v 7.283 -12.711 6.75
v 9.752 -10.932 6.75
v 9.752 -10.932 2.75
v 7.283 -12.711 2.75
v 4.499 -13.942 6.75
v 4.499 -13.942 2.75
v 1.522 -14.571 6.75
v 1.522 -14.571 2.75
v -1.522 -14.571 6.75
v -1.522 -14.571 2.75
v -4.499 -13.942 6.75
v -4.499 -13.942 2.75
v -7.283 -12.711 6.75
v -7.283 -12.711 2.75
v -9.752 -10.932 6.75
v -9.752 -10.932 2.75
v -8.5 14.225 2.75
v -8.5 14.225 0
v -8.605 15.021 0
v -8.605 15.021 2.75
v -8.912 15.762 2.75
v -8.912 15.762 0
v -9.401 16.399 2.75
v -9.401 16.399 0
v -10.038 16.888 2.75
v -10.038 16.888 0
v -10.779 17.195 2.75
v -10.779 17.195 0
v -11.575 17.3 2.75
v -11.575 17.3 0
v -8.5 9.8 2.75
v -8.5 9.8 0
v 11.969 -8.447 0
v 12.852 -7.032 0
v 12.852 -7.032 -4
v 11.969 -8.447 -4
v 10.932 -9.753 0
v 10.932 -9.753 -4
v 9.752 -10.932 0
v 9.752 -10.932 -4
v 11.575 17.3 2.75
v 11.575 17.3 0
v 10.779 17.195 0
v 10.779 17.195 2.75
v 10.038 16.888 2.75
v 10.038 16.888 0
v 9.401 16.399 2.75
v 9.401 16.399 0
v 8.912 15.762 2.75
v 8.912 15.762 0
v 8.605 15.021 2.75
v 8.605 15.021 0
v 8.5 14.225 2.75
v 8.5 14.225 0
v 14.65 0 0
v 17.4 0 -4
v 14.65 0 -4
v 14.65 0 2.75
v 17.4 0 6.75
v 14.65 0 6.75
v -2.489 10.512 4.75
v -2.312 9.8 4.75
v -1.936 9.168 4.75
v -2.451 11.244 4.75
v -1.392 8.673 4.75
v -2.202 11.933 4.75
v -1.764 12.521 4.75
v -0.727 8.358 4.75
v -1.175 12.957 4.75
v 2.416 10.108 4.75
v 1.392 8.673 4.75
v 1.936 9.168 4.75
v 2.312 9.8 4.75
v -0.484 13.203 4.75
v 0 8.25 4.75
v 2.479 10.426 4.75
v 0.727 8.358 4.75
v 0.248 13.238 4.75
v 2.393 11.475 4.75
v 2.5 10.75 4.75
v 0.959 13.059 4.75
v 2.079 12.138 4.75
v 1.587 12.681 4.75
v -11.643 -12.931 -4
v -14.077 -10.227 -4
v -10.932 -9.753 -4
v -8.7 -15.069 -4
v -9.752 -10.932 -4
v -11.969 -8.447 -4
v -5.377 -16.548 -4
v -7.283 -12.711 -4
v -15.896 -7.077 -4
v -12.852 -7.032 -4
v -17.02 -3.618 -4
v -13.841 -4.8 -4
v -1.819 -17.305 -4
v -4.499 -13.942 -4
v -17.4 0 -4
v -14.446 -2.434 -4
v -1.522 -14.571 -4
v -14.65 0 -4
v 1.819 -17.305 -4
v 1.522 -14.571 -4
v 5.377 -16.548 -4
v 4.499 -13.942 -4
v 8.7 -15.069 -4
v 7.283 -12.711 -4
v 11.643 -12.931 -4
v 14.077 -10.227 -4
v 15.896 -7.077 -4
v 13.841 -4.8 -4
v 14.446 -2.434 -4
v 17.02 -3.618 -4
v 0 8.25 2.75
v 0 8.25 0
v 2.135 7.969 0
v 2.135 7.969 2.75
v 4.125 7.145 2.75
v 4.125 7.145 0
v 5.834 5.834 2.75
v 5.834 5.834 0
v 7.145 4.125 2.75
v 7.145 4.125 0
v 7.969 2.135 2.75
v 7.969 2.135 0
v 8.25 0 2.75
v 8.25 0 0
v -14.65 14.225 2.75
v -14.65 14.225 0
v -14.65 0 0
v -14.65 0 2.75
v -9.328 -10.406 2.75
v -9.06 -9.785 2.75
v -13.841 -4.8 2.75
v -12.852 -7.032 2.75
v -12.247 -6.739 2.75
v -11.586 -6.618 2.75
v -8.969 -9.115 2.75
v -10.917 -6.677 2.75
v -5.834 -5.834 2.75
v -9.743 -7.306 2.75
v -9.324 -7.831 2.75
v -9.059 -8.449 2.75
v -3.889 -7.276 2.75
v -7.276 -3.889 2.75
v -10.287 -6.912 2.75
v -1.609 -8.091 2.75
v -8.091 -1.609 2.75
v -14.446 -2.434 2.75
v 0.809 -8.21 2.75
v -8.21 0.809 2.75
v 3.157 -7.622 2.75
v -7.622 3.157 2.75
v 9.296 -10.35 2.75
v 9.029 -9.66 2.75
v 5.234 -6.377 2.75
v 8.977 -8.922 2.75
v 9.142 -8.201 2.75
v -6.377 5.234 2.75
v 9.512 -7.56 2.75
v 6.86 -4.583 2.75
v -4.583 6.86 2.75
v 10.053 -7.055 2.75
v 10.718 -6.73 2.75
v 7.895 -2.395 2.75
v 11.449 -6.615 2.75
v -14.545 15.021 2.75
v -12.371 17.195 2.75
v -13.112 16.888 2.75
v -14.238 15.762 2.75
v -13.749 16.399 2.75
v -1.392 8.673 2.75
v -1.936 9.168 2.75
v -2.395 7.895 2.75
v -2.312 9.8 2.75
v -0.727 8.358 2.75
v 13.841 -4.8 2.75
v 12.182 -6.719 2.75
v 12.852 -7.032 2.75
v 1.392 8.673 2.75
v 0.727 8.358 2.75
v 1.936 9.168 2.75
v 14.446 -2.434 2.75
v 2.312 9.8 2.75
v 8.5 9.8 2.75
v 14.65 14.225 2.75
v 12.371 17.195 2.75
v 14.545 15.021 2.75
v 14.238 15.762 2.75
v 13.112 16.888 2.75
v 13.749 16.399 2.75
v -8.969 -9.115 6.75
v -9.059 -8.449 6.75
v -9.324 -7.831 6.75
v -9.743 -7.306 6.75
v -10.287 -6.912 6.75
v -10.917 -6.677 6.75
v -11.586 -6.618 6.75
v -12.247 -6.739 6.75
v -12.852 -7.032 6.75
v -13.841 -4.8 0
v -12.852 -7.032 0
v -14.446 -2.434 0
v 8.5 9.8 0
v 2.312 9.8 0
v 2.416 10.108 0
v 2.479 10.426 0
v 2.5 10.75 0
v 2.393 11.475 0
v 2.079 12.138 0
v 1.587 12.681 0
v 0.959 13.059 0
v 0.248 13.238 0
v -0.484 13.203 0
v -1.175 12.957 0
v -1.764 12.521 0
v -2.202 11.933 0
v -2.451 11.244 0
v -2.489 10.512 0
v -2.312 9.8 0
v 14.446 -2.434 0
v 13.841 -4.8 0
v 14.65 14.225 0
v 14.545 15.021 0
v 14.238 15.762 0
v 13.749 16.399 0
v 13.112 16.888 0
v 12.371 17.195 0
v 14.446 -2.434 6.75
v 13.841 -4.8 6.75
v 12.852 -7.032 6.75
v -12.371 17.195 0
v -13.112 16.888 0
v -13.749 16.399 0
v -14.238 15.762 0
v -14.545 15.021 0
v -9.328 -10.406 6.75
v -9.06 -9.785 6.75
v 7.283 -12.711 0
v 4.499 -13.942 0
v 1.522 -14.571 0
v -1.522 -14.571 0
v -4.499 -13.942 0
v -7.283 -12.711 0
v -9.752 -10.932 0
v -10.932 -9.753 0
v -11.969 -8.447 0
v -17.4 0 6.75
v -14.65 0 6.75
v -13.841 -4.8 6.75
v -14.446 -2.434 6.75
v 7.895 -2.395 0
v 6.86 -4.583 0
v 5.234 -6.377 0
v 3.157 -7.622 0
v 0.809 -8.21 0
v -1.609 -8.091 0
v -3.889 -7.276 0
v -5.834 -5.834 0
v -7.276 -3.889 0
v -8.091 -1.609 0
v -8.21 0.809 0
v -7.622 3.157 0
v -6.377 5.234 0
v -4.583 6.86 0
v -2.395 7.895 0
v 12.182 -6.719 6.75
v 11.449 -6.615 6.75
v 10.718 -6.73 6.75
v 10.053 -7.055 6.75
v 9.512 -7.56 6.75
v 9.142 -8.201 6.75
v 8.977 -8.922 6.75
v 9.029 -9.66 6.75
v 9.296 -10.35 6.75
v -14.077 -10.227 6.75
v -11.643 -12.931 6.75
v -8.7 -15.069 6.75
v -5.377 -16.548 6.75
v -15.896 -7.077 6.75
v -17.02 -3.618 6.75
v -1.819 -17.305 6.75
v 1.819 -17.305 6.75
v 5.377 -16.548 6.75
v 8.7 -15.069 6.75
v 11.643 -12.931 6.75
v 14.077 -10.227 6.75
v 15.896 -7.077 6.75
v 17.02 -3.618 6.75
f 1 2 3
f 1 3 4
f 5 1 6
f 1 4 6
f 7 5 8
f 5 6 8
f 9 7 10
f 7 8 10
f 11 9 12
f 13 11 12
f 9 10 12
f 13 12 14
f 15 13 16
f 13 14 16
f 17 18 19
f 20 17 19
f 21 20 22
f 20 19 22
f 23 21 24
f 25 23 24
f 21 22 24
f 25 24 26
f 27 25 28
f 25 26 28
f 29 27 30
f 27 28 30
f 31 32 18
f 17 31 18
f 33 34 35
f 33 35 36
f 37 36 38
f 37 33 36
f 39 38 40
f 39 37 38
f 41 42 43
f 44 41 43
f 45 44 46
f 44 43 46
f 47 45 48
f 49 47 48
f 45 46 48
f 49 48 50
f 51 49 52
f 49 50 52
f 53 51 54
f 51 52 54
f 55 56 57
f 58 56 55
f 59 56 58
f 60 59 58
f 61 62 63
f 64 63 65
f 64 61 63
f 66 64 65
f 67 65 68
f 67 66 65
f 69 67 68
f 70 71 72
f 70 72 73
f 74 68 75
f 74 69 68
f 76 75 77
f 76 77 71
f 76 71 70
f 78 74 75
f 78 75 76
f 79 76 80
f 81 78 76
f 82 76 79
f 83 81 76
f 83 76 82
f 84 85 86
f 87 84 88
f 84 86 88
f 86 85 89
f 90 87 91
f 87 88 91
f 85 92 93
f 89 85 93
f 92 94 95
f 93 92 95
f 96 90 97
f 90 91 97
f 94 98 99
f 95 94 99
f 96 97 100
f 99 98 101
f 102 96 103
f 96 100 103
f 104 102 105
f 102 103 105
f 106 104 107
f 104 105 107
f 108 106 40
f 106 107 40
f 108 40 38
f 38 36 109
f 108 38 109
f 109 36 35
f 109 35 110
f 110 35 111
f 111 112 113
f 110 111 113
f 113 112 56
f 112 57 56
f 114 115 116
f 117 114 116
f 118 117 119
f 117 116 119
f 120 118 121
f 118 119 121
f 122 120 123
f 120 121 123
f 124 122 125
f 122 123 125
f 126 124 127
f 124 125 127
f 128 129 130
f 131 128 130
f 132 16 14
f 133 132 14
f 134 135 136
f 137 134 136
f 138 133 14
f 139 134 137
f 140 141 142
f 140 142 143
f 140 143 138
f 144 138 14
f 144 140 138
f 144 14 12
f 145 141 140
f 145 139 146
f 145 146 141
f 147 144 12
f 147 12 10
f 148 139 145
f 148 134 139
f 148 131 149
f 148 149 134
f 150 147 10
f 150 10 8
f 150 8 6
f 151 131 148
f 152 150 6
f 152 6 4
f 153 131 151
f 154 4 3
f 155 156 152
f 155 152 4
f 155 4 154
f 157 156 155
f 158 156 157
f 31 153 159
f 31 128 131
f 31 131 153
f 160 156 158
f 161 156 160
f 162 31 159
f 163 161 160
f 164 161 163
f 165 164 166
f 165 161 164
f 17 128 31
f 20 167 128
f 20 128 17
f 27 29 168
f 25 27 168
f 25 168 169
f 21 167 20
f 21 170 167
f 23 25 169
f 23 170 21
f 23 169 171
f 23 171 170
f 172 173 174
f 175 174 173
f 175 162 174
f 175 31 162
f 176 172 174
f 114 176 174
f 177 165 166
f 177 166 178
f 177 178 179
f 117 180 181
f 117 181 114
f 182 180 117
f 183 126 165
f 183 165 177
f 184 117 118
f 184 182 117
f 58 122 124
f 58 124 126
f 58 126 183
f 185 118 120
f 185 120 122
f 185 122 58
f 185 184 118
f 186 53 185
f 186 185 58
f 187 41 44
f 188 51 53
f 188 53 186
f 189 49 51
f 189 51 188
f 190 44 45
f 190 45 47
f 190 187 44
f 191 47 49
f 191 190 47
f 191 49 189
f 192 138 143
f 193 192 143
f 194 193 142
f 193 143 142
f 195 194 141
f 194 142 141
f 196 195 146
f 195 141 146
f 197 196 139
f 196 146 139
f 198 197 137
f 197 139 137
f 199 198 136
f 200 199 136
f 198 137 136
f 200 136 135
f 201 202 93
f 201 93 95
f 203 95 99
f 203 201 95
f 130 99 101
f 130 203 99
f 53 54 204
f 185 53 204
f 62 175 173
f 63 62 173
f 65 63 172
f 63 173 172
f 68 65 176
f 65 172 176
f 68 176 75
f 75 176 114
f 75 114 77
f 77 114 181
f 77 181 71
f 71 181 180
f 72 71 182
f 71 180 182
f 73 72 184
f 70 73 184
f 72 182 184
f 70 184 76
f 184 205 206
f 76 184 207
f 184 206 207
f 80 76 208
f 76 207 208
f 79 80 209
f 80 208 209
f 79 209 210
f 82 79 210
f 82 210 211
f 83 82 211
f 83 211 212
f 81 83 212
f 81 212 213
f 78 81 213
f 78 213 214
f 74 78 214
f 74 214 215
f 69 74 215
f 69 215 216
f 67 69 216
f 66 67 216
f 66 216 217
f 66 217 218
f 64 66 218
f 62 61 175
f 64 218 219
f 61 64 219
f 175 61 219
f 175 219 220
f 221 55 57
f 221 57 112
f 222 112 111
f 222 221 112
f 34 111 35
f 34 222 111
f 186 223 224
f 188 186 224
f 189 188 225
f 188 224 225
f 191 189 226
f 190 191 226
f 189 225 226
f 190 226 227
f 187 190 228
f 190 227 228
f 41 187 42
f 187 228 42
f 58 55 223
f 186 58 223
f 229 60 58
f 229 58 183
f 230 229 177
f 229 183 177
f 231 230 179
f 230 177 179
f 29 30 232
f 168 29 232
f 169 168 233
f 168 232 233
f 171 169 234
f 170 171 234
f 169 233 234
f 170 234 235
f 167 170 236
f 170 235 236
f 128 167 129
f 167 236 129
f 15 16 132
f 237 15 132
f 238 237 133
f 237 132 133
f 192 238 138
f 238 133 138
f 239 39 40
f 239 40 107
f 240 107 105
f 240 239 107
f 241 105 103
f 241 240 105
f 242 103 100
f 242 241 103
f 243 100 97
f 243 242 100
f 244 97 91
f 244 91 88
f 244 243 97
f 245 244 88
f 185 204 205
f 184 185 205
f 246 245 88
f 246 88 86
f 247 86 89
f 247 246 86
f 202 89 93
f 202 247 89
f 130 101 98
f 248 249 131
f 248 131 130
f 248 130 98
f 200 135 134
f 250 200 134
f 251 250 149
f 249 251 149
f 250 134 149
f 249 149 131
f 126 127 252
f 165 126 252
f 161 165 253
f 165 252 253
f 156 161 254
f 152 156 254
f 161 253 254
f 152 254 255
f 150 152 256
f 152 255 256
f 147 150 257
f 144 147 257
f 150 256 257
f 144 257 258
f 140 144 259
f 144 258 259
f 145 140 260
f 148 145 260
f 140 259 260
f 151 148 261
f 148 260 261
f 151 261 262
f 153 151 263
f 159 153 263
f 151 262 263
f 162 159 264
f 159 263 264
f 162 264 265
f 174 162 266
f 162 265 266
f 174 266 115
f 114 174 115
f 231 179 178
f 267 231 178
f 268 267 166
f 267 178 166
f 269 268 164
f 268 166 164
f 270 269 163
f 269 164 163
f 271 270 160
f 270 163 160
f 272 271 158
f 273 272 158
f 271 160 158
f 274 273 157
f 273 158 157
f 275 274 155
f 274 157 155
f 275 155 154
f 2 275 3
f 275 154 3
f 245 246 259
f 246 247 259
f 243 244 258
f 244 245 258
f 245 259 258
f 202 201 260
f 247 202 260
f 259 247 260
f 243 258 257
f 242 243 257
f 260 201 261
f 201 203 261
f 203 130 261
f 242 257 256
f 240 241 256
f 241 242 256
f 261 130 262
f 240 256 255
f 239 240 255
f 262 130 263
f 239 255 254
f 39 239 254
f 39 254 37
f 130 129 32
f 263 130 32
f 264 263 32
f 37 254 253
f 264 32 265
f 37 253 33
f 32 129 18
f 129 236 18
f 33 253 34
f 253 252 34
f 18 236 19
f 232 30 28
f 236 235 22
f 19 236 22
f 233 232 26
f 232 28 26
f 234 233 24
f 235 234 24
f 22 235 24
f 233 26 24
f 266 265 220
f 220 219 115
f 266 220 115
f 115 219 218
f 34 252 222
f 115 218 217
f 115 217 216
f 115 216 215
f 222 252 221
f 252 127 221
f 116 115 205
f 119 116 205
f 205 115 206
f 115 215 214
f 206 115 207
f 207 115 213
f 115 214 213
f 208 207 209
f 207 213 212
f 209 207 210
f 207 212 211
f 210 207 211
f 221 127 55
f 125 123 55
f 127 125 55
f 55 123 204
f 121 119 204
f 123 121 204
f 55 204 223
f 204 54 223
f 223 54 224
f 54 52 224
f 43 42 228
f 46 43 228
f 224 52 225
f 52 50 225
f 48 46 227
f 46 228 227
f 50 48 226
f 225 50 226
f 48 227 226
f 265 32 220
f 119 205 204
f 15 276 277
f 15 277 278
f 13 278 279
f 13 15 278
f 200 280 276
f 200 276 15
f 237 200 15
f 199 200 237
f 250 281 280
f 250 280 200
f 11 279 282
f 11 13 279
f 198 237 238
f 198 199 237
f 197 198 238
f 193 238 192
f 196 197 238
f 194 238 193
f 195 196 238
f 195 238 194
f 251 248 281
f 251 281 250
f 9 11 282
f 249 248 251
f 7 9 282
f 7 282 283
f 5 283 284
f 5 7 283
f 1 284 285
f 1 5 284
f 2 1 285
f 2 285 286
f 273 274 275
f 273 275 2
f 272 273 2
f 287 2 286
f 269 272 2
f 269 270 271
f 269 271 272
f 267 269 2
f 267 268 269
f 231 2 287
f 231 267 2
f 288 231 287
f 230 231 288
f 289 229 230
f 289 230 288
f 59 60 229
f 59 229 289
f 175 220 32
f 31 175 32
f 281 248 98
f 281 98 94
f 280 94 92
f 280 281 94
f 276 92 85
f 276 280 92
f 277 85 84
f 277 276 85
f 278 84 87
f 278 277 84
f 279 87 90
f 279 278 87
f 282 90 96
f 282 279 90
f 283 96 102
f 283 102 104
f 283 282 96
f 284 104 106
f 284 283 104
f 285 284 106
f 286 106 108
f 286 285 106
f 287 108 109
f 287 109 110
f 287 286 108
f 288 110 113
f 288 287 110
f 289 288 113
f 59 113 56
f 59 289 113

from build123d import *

# Parameters (mm, degrees)
F1_DEPTH      = 2.75
F2_DEPTH      = 6.75
F2_DEPTH_BACK = 4
F3_DEPTH      = 6.75
F4_DEPTH      = 4.75


with BuildPart() as f1:
    # F0 (on Top) → F1 (new body)
    with BuildSketch(Plane.XY):
        with BuildLine():
            ThreePointArc((2.312466216, 9.8), (1.3919410963, 8.673344038), (1.34e-08, 8.25))
            ThreePointArc((1.34e-08, 8.25), (-1.3919410851, 8.6733440305), (-2.312466216, 9.8))
            Line((-2.312466216, 9.8), (-8.5, 9.8))
            Line((-8.5, 9.8), (-8.5, 11.9319948039))
            ThreePointArc((-8.5, 11.9319948039), (-13.02204861, 6.7118365594), (-14.65, 0))
            ThreePointArc((-14.65, 0), (-14.1933462479, -3.6292454155), (-12.8518536129, -7.0322371059))
            ThreePointArc((-12.8518536129, -7.0322371059), (-10.2873209178, -6.9119317152), (-8.9690606516, -9.1149957636))
            ThreePointArc((-8.9690606516, -9.1149957636), (-9.1731996175, -10.104451226), (-9.7522783412, -10.9323175565))
            ThreePointArc((-9.7522783412, -10.9323175565), (0, -14.65), (9.7522783412, -10.9323175565))
            ThreePointArc((9.7522783412, -10.9323175565), (9.511883066, -7.5595357357), (12.8518536129, -7.0322371059))
            ThreePointArc((12.8518536129, -7.0322371059), (14.1933462479, -3.6292454155), (14.65, 0))
            ThreePointArc((14.65, 0), (13.02204861, 6.7118365594), (8.5, 11.9319948039))
            Line((8.5, 11.9319948039), (8.5, 9.8))
            Line((8.5, 9.8), (2.312466216, 9.8))
        make_face()
        with BuildLine():
            ThreePointArc((1.34e-08, 8.25), (5.8336309495, 5.8336309401), (8.25, 0))
            ThreePointArc((8.25, 0), (-5.8336309495, -5.8336309401), (1.34e-08, 8.25))
        make_face(mode=Mode.SUBTRACT)
        with BuildLine():
            ThreePointArc((9.7522783412, -10.9323175565), (11.4690606516, -9.1149957636), (12.8518536129, -7.0322371059))
            ThreePointArc((12.8518536129, -7.0322371059), (9.511883066, -7.5595357357), (9.7522783412, -10.9323175565))
        make_face()
        with BuildLine():
            ThreePointArc((-8.9690606516, -9.1149957636), (-10.2873209178, -6.9119317152), (-12.8518536129, -7.0322371059))
            ThreePointArc((-12.8518536129, -7.0322371059), (-11.4690606516, -9.1149957636), (-9.7522783412, -10.9323175565))
            ThreePointArc((-9.7522783412, -10.9323175565), (-9.1731996175, -10.104451226), (-8.9690606516, -9.1149957636))
        make_face()
        with BuildLine():
            Line((8.5, 14.225), (8.5, 11.9319948039))
            ThreePointArc((8.5, 11.9319948039), (13.02204861, 6.7118365594), (14.65, 0))
            Line((14.65, 0), (14.65, 9.8))
            Line((14.65, 9.8), (14.65, 14.225))
            ThreePointArc((14.65, 14.225), (13.7493533521, 16.3993533521), (11.575, 17.3))
            ThreePointArc((11.575, 17.3), (9.4006466479, 16.3993533521), (8.5, 14.225))
        make_face()
        with BuildLine():
            ThreePointArc((-14.65, 0), (-13.02204861, 6.7118365594), (-8.5, 11.9319948039))
            Line((-8.5, 11.9319948039), (-8.5, 14.225))
            ThreePointArc((-8.5, 14.225), (-9.4006466479, 16.3993533521), (-11.575, 17.3))
            ThreePointArc((-11.575, 17.3), (-13.7493533521, 16.3993533521), (-14.65, 14.225))
            Line((-14.65, 14.225), (-14.65, 9.8))
            Line((-14.65, 9.8), (-14.65, 0))
        make_face()
        with BuildLine():
            ThreePointArc((-2.312466216, 9.8), (-1.3919410851, 8.6733440305), (1.34e-08, 8.25))
            ThreePointArc((1.34e-08, 8.25), (1.3919410963, 8.673344038), (2.312466216, 9.8))
            Line((2.312466216, 9.8), (0, 9.8))
            Line((0, 9.8), (-2.312466216, 9.8))
        make_face()
        with BuildLine():
            ThreePointArc((2.5, 10.75), (-0.4841665313, 13.2026684998), (-2.312466216, 9.8))
            Line((-2.312466216, 9.8), (0, 9.8))
            Line((0, 9.8), (2.312466216, 9.8))
            ThreePointArc((2.312466216, 9.8), (2.4526684998, 10.2658334687), (2.5, 10.75))
        make_face()
    extrude(amount=F1_DEPTH)

    # F0 (on Top) → F2 (join, two sides)
    with BuildSketch(Plane.XY) as f2_sk:
        with BuildLine():
            ThreePointArc((-12.8518536129, -7.0322371059), (-14.1933462479, -3.6292454155), (-14.65, 0))
            Line((-14.65, 0), (-17.4, 0))
            ThreePointArc((-17.4, 0), (0, -17.4), (17.4, 0))
            Line((17.4, 0), (14.65, 0))
            ThreePointArc((14.65, 0), (14.1933462479, -3.6292454155), (12.8518536129, -7.0322371059))
            ThreePointArc((12.8518536129, -7.0322371059), (13.6721247, -7.9332560298), (13.9690606516, -9.1149957636))
            ThreePointArc((13.9690606516, -9.1149957636), (12.458516114, -11.4108567977), (9.7522783412, -10.9323175565))
            ThreePointArc((9.7522783412, -10.9323175565), (0, -14.65), (-9.7522783412, -10.9323175565))
            ThreePointArc((-9.7522783412, -10.9323175565), (-13.4262382372, -10.6704557915), (-12.8518536129, -7.0322371059))
        make_face()
        with BuildLine():
            ThreePointArc((-9.7522783412, -10.9323175565), (-11.4690606516, -9.1149957636), (-12.8518536129, -7.0322371059))
            ThreePointArc((-12.8518536129, -7.0322371059), (-13.4262382372, -10.6704557915), (-9.7522783412, -10.9323175565))
        make_face()
        with BuildLine():
            ThreePointArc((13.9690606516, -9.1149957636), (13.6721247, -7.9332560298), (12.8518536129, -7.0322371059))
            ThreePointArc((12.8518536129, -7.0322371059), (11.4690606516, -9.1149957636), (9.7522783412, -10.9323175565))
            ThreePointArc((9.7522783412, -10.9323175565), (12.458516114, -11.4108567977), (13.9690606516, -9.1149957636))
        make_face()
    extrude(amount=F2_DEPTH)
    extrude(f2_sk.sketch, amount=-F2_DEPTH_BACK)

    # F0 (on Top) → F3 (join, through all)
    with BuildSketch(Plane.XY):
        with BuildLine():
            ThreePointArc((9.7522783412, -10.9323175565), (11.4690606516, -9.1149957636), (12.8518536129, -7.0322371059))
            ThreePointArc((12.8518536129, -7.0322371059), (9.511883066, -7.5595357357), (9.7522783412, -10.9323175565))
        make_face()
        with BuildLine():
            ThreePointArc((-8.9690606516, -9.1149957636), (-10.2873209178, -6.9119317152), (-12.8518536129, -7.0322371059))
            ThreePointArc((-12.8518536129, -7.0322371059), (-11.4690606516, -9.1149957636), (-9.7522783412, -10.9323175565))
            ThreePointArc((-9.7522783412, -10.9323175565), (-9.1731996175, -10.104451226), (-8.9690606516, -9.1149957636))
        make_face()
        with BuildLine():
            ThreePointArc((-9.7522783412, -10.9323175565), (-11.4690606516, -9.1149957636), (-12.8518536129, -7.0322371059))
            ThreePointArc((-12.8518536129, -7.0322371059), (-13.4262382372, -10.6704557915), (-9.7522783412, -10.9323175565))
        make_face()
    extrude(amount=F3_DEPTH)

    # F0 (on Top) → F4 (join)
    with BuildSketch(Plane.XY):
        with BuildLine():
            ThreePointArc((2.5, 10.75), (-0.4841665313, 13.2026684998), (-2.312466216, 9.8))
            Line((-2.312466216, 9.8), (0, 9.8))
            Line((0, 9.8), (2.312466216, 9.8))
            ThreePointArc((2.312466216, 9.8), (2.4526684998, 10.2658334687), (2.5, 10.75))
        make_face()
        with BuildLine():
            ThreePointArc((-2.312466216, 9.8), (-1.3919410851, 8.6733440305), (1.34e-08, 8.25))
            ThreePointArc((1.34e-08, 8.25), (1.3919410963, 8.673344038), (2.312466216, 9.8))
            Line((2.312466216, 9.8), (0, 9.8))
            Line((0, 9.8), (-2.312466216, 9.8))
        make_face()
    extrude(amount=F4_DEPTH)


solid = f1.part
